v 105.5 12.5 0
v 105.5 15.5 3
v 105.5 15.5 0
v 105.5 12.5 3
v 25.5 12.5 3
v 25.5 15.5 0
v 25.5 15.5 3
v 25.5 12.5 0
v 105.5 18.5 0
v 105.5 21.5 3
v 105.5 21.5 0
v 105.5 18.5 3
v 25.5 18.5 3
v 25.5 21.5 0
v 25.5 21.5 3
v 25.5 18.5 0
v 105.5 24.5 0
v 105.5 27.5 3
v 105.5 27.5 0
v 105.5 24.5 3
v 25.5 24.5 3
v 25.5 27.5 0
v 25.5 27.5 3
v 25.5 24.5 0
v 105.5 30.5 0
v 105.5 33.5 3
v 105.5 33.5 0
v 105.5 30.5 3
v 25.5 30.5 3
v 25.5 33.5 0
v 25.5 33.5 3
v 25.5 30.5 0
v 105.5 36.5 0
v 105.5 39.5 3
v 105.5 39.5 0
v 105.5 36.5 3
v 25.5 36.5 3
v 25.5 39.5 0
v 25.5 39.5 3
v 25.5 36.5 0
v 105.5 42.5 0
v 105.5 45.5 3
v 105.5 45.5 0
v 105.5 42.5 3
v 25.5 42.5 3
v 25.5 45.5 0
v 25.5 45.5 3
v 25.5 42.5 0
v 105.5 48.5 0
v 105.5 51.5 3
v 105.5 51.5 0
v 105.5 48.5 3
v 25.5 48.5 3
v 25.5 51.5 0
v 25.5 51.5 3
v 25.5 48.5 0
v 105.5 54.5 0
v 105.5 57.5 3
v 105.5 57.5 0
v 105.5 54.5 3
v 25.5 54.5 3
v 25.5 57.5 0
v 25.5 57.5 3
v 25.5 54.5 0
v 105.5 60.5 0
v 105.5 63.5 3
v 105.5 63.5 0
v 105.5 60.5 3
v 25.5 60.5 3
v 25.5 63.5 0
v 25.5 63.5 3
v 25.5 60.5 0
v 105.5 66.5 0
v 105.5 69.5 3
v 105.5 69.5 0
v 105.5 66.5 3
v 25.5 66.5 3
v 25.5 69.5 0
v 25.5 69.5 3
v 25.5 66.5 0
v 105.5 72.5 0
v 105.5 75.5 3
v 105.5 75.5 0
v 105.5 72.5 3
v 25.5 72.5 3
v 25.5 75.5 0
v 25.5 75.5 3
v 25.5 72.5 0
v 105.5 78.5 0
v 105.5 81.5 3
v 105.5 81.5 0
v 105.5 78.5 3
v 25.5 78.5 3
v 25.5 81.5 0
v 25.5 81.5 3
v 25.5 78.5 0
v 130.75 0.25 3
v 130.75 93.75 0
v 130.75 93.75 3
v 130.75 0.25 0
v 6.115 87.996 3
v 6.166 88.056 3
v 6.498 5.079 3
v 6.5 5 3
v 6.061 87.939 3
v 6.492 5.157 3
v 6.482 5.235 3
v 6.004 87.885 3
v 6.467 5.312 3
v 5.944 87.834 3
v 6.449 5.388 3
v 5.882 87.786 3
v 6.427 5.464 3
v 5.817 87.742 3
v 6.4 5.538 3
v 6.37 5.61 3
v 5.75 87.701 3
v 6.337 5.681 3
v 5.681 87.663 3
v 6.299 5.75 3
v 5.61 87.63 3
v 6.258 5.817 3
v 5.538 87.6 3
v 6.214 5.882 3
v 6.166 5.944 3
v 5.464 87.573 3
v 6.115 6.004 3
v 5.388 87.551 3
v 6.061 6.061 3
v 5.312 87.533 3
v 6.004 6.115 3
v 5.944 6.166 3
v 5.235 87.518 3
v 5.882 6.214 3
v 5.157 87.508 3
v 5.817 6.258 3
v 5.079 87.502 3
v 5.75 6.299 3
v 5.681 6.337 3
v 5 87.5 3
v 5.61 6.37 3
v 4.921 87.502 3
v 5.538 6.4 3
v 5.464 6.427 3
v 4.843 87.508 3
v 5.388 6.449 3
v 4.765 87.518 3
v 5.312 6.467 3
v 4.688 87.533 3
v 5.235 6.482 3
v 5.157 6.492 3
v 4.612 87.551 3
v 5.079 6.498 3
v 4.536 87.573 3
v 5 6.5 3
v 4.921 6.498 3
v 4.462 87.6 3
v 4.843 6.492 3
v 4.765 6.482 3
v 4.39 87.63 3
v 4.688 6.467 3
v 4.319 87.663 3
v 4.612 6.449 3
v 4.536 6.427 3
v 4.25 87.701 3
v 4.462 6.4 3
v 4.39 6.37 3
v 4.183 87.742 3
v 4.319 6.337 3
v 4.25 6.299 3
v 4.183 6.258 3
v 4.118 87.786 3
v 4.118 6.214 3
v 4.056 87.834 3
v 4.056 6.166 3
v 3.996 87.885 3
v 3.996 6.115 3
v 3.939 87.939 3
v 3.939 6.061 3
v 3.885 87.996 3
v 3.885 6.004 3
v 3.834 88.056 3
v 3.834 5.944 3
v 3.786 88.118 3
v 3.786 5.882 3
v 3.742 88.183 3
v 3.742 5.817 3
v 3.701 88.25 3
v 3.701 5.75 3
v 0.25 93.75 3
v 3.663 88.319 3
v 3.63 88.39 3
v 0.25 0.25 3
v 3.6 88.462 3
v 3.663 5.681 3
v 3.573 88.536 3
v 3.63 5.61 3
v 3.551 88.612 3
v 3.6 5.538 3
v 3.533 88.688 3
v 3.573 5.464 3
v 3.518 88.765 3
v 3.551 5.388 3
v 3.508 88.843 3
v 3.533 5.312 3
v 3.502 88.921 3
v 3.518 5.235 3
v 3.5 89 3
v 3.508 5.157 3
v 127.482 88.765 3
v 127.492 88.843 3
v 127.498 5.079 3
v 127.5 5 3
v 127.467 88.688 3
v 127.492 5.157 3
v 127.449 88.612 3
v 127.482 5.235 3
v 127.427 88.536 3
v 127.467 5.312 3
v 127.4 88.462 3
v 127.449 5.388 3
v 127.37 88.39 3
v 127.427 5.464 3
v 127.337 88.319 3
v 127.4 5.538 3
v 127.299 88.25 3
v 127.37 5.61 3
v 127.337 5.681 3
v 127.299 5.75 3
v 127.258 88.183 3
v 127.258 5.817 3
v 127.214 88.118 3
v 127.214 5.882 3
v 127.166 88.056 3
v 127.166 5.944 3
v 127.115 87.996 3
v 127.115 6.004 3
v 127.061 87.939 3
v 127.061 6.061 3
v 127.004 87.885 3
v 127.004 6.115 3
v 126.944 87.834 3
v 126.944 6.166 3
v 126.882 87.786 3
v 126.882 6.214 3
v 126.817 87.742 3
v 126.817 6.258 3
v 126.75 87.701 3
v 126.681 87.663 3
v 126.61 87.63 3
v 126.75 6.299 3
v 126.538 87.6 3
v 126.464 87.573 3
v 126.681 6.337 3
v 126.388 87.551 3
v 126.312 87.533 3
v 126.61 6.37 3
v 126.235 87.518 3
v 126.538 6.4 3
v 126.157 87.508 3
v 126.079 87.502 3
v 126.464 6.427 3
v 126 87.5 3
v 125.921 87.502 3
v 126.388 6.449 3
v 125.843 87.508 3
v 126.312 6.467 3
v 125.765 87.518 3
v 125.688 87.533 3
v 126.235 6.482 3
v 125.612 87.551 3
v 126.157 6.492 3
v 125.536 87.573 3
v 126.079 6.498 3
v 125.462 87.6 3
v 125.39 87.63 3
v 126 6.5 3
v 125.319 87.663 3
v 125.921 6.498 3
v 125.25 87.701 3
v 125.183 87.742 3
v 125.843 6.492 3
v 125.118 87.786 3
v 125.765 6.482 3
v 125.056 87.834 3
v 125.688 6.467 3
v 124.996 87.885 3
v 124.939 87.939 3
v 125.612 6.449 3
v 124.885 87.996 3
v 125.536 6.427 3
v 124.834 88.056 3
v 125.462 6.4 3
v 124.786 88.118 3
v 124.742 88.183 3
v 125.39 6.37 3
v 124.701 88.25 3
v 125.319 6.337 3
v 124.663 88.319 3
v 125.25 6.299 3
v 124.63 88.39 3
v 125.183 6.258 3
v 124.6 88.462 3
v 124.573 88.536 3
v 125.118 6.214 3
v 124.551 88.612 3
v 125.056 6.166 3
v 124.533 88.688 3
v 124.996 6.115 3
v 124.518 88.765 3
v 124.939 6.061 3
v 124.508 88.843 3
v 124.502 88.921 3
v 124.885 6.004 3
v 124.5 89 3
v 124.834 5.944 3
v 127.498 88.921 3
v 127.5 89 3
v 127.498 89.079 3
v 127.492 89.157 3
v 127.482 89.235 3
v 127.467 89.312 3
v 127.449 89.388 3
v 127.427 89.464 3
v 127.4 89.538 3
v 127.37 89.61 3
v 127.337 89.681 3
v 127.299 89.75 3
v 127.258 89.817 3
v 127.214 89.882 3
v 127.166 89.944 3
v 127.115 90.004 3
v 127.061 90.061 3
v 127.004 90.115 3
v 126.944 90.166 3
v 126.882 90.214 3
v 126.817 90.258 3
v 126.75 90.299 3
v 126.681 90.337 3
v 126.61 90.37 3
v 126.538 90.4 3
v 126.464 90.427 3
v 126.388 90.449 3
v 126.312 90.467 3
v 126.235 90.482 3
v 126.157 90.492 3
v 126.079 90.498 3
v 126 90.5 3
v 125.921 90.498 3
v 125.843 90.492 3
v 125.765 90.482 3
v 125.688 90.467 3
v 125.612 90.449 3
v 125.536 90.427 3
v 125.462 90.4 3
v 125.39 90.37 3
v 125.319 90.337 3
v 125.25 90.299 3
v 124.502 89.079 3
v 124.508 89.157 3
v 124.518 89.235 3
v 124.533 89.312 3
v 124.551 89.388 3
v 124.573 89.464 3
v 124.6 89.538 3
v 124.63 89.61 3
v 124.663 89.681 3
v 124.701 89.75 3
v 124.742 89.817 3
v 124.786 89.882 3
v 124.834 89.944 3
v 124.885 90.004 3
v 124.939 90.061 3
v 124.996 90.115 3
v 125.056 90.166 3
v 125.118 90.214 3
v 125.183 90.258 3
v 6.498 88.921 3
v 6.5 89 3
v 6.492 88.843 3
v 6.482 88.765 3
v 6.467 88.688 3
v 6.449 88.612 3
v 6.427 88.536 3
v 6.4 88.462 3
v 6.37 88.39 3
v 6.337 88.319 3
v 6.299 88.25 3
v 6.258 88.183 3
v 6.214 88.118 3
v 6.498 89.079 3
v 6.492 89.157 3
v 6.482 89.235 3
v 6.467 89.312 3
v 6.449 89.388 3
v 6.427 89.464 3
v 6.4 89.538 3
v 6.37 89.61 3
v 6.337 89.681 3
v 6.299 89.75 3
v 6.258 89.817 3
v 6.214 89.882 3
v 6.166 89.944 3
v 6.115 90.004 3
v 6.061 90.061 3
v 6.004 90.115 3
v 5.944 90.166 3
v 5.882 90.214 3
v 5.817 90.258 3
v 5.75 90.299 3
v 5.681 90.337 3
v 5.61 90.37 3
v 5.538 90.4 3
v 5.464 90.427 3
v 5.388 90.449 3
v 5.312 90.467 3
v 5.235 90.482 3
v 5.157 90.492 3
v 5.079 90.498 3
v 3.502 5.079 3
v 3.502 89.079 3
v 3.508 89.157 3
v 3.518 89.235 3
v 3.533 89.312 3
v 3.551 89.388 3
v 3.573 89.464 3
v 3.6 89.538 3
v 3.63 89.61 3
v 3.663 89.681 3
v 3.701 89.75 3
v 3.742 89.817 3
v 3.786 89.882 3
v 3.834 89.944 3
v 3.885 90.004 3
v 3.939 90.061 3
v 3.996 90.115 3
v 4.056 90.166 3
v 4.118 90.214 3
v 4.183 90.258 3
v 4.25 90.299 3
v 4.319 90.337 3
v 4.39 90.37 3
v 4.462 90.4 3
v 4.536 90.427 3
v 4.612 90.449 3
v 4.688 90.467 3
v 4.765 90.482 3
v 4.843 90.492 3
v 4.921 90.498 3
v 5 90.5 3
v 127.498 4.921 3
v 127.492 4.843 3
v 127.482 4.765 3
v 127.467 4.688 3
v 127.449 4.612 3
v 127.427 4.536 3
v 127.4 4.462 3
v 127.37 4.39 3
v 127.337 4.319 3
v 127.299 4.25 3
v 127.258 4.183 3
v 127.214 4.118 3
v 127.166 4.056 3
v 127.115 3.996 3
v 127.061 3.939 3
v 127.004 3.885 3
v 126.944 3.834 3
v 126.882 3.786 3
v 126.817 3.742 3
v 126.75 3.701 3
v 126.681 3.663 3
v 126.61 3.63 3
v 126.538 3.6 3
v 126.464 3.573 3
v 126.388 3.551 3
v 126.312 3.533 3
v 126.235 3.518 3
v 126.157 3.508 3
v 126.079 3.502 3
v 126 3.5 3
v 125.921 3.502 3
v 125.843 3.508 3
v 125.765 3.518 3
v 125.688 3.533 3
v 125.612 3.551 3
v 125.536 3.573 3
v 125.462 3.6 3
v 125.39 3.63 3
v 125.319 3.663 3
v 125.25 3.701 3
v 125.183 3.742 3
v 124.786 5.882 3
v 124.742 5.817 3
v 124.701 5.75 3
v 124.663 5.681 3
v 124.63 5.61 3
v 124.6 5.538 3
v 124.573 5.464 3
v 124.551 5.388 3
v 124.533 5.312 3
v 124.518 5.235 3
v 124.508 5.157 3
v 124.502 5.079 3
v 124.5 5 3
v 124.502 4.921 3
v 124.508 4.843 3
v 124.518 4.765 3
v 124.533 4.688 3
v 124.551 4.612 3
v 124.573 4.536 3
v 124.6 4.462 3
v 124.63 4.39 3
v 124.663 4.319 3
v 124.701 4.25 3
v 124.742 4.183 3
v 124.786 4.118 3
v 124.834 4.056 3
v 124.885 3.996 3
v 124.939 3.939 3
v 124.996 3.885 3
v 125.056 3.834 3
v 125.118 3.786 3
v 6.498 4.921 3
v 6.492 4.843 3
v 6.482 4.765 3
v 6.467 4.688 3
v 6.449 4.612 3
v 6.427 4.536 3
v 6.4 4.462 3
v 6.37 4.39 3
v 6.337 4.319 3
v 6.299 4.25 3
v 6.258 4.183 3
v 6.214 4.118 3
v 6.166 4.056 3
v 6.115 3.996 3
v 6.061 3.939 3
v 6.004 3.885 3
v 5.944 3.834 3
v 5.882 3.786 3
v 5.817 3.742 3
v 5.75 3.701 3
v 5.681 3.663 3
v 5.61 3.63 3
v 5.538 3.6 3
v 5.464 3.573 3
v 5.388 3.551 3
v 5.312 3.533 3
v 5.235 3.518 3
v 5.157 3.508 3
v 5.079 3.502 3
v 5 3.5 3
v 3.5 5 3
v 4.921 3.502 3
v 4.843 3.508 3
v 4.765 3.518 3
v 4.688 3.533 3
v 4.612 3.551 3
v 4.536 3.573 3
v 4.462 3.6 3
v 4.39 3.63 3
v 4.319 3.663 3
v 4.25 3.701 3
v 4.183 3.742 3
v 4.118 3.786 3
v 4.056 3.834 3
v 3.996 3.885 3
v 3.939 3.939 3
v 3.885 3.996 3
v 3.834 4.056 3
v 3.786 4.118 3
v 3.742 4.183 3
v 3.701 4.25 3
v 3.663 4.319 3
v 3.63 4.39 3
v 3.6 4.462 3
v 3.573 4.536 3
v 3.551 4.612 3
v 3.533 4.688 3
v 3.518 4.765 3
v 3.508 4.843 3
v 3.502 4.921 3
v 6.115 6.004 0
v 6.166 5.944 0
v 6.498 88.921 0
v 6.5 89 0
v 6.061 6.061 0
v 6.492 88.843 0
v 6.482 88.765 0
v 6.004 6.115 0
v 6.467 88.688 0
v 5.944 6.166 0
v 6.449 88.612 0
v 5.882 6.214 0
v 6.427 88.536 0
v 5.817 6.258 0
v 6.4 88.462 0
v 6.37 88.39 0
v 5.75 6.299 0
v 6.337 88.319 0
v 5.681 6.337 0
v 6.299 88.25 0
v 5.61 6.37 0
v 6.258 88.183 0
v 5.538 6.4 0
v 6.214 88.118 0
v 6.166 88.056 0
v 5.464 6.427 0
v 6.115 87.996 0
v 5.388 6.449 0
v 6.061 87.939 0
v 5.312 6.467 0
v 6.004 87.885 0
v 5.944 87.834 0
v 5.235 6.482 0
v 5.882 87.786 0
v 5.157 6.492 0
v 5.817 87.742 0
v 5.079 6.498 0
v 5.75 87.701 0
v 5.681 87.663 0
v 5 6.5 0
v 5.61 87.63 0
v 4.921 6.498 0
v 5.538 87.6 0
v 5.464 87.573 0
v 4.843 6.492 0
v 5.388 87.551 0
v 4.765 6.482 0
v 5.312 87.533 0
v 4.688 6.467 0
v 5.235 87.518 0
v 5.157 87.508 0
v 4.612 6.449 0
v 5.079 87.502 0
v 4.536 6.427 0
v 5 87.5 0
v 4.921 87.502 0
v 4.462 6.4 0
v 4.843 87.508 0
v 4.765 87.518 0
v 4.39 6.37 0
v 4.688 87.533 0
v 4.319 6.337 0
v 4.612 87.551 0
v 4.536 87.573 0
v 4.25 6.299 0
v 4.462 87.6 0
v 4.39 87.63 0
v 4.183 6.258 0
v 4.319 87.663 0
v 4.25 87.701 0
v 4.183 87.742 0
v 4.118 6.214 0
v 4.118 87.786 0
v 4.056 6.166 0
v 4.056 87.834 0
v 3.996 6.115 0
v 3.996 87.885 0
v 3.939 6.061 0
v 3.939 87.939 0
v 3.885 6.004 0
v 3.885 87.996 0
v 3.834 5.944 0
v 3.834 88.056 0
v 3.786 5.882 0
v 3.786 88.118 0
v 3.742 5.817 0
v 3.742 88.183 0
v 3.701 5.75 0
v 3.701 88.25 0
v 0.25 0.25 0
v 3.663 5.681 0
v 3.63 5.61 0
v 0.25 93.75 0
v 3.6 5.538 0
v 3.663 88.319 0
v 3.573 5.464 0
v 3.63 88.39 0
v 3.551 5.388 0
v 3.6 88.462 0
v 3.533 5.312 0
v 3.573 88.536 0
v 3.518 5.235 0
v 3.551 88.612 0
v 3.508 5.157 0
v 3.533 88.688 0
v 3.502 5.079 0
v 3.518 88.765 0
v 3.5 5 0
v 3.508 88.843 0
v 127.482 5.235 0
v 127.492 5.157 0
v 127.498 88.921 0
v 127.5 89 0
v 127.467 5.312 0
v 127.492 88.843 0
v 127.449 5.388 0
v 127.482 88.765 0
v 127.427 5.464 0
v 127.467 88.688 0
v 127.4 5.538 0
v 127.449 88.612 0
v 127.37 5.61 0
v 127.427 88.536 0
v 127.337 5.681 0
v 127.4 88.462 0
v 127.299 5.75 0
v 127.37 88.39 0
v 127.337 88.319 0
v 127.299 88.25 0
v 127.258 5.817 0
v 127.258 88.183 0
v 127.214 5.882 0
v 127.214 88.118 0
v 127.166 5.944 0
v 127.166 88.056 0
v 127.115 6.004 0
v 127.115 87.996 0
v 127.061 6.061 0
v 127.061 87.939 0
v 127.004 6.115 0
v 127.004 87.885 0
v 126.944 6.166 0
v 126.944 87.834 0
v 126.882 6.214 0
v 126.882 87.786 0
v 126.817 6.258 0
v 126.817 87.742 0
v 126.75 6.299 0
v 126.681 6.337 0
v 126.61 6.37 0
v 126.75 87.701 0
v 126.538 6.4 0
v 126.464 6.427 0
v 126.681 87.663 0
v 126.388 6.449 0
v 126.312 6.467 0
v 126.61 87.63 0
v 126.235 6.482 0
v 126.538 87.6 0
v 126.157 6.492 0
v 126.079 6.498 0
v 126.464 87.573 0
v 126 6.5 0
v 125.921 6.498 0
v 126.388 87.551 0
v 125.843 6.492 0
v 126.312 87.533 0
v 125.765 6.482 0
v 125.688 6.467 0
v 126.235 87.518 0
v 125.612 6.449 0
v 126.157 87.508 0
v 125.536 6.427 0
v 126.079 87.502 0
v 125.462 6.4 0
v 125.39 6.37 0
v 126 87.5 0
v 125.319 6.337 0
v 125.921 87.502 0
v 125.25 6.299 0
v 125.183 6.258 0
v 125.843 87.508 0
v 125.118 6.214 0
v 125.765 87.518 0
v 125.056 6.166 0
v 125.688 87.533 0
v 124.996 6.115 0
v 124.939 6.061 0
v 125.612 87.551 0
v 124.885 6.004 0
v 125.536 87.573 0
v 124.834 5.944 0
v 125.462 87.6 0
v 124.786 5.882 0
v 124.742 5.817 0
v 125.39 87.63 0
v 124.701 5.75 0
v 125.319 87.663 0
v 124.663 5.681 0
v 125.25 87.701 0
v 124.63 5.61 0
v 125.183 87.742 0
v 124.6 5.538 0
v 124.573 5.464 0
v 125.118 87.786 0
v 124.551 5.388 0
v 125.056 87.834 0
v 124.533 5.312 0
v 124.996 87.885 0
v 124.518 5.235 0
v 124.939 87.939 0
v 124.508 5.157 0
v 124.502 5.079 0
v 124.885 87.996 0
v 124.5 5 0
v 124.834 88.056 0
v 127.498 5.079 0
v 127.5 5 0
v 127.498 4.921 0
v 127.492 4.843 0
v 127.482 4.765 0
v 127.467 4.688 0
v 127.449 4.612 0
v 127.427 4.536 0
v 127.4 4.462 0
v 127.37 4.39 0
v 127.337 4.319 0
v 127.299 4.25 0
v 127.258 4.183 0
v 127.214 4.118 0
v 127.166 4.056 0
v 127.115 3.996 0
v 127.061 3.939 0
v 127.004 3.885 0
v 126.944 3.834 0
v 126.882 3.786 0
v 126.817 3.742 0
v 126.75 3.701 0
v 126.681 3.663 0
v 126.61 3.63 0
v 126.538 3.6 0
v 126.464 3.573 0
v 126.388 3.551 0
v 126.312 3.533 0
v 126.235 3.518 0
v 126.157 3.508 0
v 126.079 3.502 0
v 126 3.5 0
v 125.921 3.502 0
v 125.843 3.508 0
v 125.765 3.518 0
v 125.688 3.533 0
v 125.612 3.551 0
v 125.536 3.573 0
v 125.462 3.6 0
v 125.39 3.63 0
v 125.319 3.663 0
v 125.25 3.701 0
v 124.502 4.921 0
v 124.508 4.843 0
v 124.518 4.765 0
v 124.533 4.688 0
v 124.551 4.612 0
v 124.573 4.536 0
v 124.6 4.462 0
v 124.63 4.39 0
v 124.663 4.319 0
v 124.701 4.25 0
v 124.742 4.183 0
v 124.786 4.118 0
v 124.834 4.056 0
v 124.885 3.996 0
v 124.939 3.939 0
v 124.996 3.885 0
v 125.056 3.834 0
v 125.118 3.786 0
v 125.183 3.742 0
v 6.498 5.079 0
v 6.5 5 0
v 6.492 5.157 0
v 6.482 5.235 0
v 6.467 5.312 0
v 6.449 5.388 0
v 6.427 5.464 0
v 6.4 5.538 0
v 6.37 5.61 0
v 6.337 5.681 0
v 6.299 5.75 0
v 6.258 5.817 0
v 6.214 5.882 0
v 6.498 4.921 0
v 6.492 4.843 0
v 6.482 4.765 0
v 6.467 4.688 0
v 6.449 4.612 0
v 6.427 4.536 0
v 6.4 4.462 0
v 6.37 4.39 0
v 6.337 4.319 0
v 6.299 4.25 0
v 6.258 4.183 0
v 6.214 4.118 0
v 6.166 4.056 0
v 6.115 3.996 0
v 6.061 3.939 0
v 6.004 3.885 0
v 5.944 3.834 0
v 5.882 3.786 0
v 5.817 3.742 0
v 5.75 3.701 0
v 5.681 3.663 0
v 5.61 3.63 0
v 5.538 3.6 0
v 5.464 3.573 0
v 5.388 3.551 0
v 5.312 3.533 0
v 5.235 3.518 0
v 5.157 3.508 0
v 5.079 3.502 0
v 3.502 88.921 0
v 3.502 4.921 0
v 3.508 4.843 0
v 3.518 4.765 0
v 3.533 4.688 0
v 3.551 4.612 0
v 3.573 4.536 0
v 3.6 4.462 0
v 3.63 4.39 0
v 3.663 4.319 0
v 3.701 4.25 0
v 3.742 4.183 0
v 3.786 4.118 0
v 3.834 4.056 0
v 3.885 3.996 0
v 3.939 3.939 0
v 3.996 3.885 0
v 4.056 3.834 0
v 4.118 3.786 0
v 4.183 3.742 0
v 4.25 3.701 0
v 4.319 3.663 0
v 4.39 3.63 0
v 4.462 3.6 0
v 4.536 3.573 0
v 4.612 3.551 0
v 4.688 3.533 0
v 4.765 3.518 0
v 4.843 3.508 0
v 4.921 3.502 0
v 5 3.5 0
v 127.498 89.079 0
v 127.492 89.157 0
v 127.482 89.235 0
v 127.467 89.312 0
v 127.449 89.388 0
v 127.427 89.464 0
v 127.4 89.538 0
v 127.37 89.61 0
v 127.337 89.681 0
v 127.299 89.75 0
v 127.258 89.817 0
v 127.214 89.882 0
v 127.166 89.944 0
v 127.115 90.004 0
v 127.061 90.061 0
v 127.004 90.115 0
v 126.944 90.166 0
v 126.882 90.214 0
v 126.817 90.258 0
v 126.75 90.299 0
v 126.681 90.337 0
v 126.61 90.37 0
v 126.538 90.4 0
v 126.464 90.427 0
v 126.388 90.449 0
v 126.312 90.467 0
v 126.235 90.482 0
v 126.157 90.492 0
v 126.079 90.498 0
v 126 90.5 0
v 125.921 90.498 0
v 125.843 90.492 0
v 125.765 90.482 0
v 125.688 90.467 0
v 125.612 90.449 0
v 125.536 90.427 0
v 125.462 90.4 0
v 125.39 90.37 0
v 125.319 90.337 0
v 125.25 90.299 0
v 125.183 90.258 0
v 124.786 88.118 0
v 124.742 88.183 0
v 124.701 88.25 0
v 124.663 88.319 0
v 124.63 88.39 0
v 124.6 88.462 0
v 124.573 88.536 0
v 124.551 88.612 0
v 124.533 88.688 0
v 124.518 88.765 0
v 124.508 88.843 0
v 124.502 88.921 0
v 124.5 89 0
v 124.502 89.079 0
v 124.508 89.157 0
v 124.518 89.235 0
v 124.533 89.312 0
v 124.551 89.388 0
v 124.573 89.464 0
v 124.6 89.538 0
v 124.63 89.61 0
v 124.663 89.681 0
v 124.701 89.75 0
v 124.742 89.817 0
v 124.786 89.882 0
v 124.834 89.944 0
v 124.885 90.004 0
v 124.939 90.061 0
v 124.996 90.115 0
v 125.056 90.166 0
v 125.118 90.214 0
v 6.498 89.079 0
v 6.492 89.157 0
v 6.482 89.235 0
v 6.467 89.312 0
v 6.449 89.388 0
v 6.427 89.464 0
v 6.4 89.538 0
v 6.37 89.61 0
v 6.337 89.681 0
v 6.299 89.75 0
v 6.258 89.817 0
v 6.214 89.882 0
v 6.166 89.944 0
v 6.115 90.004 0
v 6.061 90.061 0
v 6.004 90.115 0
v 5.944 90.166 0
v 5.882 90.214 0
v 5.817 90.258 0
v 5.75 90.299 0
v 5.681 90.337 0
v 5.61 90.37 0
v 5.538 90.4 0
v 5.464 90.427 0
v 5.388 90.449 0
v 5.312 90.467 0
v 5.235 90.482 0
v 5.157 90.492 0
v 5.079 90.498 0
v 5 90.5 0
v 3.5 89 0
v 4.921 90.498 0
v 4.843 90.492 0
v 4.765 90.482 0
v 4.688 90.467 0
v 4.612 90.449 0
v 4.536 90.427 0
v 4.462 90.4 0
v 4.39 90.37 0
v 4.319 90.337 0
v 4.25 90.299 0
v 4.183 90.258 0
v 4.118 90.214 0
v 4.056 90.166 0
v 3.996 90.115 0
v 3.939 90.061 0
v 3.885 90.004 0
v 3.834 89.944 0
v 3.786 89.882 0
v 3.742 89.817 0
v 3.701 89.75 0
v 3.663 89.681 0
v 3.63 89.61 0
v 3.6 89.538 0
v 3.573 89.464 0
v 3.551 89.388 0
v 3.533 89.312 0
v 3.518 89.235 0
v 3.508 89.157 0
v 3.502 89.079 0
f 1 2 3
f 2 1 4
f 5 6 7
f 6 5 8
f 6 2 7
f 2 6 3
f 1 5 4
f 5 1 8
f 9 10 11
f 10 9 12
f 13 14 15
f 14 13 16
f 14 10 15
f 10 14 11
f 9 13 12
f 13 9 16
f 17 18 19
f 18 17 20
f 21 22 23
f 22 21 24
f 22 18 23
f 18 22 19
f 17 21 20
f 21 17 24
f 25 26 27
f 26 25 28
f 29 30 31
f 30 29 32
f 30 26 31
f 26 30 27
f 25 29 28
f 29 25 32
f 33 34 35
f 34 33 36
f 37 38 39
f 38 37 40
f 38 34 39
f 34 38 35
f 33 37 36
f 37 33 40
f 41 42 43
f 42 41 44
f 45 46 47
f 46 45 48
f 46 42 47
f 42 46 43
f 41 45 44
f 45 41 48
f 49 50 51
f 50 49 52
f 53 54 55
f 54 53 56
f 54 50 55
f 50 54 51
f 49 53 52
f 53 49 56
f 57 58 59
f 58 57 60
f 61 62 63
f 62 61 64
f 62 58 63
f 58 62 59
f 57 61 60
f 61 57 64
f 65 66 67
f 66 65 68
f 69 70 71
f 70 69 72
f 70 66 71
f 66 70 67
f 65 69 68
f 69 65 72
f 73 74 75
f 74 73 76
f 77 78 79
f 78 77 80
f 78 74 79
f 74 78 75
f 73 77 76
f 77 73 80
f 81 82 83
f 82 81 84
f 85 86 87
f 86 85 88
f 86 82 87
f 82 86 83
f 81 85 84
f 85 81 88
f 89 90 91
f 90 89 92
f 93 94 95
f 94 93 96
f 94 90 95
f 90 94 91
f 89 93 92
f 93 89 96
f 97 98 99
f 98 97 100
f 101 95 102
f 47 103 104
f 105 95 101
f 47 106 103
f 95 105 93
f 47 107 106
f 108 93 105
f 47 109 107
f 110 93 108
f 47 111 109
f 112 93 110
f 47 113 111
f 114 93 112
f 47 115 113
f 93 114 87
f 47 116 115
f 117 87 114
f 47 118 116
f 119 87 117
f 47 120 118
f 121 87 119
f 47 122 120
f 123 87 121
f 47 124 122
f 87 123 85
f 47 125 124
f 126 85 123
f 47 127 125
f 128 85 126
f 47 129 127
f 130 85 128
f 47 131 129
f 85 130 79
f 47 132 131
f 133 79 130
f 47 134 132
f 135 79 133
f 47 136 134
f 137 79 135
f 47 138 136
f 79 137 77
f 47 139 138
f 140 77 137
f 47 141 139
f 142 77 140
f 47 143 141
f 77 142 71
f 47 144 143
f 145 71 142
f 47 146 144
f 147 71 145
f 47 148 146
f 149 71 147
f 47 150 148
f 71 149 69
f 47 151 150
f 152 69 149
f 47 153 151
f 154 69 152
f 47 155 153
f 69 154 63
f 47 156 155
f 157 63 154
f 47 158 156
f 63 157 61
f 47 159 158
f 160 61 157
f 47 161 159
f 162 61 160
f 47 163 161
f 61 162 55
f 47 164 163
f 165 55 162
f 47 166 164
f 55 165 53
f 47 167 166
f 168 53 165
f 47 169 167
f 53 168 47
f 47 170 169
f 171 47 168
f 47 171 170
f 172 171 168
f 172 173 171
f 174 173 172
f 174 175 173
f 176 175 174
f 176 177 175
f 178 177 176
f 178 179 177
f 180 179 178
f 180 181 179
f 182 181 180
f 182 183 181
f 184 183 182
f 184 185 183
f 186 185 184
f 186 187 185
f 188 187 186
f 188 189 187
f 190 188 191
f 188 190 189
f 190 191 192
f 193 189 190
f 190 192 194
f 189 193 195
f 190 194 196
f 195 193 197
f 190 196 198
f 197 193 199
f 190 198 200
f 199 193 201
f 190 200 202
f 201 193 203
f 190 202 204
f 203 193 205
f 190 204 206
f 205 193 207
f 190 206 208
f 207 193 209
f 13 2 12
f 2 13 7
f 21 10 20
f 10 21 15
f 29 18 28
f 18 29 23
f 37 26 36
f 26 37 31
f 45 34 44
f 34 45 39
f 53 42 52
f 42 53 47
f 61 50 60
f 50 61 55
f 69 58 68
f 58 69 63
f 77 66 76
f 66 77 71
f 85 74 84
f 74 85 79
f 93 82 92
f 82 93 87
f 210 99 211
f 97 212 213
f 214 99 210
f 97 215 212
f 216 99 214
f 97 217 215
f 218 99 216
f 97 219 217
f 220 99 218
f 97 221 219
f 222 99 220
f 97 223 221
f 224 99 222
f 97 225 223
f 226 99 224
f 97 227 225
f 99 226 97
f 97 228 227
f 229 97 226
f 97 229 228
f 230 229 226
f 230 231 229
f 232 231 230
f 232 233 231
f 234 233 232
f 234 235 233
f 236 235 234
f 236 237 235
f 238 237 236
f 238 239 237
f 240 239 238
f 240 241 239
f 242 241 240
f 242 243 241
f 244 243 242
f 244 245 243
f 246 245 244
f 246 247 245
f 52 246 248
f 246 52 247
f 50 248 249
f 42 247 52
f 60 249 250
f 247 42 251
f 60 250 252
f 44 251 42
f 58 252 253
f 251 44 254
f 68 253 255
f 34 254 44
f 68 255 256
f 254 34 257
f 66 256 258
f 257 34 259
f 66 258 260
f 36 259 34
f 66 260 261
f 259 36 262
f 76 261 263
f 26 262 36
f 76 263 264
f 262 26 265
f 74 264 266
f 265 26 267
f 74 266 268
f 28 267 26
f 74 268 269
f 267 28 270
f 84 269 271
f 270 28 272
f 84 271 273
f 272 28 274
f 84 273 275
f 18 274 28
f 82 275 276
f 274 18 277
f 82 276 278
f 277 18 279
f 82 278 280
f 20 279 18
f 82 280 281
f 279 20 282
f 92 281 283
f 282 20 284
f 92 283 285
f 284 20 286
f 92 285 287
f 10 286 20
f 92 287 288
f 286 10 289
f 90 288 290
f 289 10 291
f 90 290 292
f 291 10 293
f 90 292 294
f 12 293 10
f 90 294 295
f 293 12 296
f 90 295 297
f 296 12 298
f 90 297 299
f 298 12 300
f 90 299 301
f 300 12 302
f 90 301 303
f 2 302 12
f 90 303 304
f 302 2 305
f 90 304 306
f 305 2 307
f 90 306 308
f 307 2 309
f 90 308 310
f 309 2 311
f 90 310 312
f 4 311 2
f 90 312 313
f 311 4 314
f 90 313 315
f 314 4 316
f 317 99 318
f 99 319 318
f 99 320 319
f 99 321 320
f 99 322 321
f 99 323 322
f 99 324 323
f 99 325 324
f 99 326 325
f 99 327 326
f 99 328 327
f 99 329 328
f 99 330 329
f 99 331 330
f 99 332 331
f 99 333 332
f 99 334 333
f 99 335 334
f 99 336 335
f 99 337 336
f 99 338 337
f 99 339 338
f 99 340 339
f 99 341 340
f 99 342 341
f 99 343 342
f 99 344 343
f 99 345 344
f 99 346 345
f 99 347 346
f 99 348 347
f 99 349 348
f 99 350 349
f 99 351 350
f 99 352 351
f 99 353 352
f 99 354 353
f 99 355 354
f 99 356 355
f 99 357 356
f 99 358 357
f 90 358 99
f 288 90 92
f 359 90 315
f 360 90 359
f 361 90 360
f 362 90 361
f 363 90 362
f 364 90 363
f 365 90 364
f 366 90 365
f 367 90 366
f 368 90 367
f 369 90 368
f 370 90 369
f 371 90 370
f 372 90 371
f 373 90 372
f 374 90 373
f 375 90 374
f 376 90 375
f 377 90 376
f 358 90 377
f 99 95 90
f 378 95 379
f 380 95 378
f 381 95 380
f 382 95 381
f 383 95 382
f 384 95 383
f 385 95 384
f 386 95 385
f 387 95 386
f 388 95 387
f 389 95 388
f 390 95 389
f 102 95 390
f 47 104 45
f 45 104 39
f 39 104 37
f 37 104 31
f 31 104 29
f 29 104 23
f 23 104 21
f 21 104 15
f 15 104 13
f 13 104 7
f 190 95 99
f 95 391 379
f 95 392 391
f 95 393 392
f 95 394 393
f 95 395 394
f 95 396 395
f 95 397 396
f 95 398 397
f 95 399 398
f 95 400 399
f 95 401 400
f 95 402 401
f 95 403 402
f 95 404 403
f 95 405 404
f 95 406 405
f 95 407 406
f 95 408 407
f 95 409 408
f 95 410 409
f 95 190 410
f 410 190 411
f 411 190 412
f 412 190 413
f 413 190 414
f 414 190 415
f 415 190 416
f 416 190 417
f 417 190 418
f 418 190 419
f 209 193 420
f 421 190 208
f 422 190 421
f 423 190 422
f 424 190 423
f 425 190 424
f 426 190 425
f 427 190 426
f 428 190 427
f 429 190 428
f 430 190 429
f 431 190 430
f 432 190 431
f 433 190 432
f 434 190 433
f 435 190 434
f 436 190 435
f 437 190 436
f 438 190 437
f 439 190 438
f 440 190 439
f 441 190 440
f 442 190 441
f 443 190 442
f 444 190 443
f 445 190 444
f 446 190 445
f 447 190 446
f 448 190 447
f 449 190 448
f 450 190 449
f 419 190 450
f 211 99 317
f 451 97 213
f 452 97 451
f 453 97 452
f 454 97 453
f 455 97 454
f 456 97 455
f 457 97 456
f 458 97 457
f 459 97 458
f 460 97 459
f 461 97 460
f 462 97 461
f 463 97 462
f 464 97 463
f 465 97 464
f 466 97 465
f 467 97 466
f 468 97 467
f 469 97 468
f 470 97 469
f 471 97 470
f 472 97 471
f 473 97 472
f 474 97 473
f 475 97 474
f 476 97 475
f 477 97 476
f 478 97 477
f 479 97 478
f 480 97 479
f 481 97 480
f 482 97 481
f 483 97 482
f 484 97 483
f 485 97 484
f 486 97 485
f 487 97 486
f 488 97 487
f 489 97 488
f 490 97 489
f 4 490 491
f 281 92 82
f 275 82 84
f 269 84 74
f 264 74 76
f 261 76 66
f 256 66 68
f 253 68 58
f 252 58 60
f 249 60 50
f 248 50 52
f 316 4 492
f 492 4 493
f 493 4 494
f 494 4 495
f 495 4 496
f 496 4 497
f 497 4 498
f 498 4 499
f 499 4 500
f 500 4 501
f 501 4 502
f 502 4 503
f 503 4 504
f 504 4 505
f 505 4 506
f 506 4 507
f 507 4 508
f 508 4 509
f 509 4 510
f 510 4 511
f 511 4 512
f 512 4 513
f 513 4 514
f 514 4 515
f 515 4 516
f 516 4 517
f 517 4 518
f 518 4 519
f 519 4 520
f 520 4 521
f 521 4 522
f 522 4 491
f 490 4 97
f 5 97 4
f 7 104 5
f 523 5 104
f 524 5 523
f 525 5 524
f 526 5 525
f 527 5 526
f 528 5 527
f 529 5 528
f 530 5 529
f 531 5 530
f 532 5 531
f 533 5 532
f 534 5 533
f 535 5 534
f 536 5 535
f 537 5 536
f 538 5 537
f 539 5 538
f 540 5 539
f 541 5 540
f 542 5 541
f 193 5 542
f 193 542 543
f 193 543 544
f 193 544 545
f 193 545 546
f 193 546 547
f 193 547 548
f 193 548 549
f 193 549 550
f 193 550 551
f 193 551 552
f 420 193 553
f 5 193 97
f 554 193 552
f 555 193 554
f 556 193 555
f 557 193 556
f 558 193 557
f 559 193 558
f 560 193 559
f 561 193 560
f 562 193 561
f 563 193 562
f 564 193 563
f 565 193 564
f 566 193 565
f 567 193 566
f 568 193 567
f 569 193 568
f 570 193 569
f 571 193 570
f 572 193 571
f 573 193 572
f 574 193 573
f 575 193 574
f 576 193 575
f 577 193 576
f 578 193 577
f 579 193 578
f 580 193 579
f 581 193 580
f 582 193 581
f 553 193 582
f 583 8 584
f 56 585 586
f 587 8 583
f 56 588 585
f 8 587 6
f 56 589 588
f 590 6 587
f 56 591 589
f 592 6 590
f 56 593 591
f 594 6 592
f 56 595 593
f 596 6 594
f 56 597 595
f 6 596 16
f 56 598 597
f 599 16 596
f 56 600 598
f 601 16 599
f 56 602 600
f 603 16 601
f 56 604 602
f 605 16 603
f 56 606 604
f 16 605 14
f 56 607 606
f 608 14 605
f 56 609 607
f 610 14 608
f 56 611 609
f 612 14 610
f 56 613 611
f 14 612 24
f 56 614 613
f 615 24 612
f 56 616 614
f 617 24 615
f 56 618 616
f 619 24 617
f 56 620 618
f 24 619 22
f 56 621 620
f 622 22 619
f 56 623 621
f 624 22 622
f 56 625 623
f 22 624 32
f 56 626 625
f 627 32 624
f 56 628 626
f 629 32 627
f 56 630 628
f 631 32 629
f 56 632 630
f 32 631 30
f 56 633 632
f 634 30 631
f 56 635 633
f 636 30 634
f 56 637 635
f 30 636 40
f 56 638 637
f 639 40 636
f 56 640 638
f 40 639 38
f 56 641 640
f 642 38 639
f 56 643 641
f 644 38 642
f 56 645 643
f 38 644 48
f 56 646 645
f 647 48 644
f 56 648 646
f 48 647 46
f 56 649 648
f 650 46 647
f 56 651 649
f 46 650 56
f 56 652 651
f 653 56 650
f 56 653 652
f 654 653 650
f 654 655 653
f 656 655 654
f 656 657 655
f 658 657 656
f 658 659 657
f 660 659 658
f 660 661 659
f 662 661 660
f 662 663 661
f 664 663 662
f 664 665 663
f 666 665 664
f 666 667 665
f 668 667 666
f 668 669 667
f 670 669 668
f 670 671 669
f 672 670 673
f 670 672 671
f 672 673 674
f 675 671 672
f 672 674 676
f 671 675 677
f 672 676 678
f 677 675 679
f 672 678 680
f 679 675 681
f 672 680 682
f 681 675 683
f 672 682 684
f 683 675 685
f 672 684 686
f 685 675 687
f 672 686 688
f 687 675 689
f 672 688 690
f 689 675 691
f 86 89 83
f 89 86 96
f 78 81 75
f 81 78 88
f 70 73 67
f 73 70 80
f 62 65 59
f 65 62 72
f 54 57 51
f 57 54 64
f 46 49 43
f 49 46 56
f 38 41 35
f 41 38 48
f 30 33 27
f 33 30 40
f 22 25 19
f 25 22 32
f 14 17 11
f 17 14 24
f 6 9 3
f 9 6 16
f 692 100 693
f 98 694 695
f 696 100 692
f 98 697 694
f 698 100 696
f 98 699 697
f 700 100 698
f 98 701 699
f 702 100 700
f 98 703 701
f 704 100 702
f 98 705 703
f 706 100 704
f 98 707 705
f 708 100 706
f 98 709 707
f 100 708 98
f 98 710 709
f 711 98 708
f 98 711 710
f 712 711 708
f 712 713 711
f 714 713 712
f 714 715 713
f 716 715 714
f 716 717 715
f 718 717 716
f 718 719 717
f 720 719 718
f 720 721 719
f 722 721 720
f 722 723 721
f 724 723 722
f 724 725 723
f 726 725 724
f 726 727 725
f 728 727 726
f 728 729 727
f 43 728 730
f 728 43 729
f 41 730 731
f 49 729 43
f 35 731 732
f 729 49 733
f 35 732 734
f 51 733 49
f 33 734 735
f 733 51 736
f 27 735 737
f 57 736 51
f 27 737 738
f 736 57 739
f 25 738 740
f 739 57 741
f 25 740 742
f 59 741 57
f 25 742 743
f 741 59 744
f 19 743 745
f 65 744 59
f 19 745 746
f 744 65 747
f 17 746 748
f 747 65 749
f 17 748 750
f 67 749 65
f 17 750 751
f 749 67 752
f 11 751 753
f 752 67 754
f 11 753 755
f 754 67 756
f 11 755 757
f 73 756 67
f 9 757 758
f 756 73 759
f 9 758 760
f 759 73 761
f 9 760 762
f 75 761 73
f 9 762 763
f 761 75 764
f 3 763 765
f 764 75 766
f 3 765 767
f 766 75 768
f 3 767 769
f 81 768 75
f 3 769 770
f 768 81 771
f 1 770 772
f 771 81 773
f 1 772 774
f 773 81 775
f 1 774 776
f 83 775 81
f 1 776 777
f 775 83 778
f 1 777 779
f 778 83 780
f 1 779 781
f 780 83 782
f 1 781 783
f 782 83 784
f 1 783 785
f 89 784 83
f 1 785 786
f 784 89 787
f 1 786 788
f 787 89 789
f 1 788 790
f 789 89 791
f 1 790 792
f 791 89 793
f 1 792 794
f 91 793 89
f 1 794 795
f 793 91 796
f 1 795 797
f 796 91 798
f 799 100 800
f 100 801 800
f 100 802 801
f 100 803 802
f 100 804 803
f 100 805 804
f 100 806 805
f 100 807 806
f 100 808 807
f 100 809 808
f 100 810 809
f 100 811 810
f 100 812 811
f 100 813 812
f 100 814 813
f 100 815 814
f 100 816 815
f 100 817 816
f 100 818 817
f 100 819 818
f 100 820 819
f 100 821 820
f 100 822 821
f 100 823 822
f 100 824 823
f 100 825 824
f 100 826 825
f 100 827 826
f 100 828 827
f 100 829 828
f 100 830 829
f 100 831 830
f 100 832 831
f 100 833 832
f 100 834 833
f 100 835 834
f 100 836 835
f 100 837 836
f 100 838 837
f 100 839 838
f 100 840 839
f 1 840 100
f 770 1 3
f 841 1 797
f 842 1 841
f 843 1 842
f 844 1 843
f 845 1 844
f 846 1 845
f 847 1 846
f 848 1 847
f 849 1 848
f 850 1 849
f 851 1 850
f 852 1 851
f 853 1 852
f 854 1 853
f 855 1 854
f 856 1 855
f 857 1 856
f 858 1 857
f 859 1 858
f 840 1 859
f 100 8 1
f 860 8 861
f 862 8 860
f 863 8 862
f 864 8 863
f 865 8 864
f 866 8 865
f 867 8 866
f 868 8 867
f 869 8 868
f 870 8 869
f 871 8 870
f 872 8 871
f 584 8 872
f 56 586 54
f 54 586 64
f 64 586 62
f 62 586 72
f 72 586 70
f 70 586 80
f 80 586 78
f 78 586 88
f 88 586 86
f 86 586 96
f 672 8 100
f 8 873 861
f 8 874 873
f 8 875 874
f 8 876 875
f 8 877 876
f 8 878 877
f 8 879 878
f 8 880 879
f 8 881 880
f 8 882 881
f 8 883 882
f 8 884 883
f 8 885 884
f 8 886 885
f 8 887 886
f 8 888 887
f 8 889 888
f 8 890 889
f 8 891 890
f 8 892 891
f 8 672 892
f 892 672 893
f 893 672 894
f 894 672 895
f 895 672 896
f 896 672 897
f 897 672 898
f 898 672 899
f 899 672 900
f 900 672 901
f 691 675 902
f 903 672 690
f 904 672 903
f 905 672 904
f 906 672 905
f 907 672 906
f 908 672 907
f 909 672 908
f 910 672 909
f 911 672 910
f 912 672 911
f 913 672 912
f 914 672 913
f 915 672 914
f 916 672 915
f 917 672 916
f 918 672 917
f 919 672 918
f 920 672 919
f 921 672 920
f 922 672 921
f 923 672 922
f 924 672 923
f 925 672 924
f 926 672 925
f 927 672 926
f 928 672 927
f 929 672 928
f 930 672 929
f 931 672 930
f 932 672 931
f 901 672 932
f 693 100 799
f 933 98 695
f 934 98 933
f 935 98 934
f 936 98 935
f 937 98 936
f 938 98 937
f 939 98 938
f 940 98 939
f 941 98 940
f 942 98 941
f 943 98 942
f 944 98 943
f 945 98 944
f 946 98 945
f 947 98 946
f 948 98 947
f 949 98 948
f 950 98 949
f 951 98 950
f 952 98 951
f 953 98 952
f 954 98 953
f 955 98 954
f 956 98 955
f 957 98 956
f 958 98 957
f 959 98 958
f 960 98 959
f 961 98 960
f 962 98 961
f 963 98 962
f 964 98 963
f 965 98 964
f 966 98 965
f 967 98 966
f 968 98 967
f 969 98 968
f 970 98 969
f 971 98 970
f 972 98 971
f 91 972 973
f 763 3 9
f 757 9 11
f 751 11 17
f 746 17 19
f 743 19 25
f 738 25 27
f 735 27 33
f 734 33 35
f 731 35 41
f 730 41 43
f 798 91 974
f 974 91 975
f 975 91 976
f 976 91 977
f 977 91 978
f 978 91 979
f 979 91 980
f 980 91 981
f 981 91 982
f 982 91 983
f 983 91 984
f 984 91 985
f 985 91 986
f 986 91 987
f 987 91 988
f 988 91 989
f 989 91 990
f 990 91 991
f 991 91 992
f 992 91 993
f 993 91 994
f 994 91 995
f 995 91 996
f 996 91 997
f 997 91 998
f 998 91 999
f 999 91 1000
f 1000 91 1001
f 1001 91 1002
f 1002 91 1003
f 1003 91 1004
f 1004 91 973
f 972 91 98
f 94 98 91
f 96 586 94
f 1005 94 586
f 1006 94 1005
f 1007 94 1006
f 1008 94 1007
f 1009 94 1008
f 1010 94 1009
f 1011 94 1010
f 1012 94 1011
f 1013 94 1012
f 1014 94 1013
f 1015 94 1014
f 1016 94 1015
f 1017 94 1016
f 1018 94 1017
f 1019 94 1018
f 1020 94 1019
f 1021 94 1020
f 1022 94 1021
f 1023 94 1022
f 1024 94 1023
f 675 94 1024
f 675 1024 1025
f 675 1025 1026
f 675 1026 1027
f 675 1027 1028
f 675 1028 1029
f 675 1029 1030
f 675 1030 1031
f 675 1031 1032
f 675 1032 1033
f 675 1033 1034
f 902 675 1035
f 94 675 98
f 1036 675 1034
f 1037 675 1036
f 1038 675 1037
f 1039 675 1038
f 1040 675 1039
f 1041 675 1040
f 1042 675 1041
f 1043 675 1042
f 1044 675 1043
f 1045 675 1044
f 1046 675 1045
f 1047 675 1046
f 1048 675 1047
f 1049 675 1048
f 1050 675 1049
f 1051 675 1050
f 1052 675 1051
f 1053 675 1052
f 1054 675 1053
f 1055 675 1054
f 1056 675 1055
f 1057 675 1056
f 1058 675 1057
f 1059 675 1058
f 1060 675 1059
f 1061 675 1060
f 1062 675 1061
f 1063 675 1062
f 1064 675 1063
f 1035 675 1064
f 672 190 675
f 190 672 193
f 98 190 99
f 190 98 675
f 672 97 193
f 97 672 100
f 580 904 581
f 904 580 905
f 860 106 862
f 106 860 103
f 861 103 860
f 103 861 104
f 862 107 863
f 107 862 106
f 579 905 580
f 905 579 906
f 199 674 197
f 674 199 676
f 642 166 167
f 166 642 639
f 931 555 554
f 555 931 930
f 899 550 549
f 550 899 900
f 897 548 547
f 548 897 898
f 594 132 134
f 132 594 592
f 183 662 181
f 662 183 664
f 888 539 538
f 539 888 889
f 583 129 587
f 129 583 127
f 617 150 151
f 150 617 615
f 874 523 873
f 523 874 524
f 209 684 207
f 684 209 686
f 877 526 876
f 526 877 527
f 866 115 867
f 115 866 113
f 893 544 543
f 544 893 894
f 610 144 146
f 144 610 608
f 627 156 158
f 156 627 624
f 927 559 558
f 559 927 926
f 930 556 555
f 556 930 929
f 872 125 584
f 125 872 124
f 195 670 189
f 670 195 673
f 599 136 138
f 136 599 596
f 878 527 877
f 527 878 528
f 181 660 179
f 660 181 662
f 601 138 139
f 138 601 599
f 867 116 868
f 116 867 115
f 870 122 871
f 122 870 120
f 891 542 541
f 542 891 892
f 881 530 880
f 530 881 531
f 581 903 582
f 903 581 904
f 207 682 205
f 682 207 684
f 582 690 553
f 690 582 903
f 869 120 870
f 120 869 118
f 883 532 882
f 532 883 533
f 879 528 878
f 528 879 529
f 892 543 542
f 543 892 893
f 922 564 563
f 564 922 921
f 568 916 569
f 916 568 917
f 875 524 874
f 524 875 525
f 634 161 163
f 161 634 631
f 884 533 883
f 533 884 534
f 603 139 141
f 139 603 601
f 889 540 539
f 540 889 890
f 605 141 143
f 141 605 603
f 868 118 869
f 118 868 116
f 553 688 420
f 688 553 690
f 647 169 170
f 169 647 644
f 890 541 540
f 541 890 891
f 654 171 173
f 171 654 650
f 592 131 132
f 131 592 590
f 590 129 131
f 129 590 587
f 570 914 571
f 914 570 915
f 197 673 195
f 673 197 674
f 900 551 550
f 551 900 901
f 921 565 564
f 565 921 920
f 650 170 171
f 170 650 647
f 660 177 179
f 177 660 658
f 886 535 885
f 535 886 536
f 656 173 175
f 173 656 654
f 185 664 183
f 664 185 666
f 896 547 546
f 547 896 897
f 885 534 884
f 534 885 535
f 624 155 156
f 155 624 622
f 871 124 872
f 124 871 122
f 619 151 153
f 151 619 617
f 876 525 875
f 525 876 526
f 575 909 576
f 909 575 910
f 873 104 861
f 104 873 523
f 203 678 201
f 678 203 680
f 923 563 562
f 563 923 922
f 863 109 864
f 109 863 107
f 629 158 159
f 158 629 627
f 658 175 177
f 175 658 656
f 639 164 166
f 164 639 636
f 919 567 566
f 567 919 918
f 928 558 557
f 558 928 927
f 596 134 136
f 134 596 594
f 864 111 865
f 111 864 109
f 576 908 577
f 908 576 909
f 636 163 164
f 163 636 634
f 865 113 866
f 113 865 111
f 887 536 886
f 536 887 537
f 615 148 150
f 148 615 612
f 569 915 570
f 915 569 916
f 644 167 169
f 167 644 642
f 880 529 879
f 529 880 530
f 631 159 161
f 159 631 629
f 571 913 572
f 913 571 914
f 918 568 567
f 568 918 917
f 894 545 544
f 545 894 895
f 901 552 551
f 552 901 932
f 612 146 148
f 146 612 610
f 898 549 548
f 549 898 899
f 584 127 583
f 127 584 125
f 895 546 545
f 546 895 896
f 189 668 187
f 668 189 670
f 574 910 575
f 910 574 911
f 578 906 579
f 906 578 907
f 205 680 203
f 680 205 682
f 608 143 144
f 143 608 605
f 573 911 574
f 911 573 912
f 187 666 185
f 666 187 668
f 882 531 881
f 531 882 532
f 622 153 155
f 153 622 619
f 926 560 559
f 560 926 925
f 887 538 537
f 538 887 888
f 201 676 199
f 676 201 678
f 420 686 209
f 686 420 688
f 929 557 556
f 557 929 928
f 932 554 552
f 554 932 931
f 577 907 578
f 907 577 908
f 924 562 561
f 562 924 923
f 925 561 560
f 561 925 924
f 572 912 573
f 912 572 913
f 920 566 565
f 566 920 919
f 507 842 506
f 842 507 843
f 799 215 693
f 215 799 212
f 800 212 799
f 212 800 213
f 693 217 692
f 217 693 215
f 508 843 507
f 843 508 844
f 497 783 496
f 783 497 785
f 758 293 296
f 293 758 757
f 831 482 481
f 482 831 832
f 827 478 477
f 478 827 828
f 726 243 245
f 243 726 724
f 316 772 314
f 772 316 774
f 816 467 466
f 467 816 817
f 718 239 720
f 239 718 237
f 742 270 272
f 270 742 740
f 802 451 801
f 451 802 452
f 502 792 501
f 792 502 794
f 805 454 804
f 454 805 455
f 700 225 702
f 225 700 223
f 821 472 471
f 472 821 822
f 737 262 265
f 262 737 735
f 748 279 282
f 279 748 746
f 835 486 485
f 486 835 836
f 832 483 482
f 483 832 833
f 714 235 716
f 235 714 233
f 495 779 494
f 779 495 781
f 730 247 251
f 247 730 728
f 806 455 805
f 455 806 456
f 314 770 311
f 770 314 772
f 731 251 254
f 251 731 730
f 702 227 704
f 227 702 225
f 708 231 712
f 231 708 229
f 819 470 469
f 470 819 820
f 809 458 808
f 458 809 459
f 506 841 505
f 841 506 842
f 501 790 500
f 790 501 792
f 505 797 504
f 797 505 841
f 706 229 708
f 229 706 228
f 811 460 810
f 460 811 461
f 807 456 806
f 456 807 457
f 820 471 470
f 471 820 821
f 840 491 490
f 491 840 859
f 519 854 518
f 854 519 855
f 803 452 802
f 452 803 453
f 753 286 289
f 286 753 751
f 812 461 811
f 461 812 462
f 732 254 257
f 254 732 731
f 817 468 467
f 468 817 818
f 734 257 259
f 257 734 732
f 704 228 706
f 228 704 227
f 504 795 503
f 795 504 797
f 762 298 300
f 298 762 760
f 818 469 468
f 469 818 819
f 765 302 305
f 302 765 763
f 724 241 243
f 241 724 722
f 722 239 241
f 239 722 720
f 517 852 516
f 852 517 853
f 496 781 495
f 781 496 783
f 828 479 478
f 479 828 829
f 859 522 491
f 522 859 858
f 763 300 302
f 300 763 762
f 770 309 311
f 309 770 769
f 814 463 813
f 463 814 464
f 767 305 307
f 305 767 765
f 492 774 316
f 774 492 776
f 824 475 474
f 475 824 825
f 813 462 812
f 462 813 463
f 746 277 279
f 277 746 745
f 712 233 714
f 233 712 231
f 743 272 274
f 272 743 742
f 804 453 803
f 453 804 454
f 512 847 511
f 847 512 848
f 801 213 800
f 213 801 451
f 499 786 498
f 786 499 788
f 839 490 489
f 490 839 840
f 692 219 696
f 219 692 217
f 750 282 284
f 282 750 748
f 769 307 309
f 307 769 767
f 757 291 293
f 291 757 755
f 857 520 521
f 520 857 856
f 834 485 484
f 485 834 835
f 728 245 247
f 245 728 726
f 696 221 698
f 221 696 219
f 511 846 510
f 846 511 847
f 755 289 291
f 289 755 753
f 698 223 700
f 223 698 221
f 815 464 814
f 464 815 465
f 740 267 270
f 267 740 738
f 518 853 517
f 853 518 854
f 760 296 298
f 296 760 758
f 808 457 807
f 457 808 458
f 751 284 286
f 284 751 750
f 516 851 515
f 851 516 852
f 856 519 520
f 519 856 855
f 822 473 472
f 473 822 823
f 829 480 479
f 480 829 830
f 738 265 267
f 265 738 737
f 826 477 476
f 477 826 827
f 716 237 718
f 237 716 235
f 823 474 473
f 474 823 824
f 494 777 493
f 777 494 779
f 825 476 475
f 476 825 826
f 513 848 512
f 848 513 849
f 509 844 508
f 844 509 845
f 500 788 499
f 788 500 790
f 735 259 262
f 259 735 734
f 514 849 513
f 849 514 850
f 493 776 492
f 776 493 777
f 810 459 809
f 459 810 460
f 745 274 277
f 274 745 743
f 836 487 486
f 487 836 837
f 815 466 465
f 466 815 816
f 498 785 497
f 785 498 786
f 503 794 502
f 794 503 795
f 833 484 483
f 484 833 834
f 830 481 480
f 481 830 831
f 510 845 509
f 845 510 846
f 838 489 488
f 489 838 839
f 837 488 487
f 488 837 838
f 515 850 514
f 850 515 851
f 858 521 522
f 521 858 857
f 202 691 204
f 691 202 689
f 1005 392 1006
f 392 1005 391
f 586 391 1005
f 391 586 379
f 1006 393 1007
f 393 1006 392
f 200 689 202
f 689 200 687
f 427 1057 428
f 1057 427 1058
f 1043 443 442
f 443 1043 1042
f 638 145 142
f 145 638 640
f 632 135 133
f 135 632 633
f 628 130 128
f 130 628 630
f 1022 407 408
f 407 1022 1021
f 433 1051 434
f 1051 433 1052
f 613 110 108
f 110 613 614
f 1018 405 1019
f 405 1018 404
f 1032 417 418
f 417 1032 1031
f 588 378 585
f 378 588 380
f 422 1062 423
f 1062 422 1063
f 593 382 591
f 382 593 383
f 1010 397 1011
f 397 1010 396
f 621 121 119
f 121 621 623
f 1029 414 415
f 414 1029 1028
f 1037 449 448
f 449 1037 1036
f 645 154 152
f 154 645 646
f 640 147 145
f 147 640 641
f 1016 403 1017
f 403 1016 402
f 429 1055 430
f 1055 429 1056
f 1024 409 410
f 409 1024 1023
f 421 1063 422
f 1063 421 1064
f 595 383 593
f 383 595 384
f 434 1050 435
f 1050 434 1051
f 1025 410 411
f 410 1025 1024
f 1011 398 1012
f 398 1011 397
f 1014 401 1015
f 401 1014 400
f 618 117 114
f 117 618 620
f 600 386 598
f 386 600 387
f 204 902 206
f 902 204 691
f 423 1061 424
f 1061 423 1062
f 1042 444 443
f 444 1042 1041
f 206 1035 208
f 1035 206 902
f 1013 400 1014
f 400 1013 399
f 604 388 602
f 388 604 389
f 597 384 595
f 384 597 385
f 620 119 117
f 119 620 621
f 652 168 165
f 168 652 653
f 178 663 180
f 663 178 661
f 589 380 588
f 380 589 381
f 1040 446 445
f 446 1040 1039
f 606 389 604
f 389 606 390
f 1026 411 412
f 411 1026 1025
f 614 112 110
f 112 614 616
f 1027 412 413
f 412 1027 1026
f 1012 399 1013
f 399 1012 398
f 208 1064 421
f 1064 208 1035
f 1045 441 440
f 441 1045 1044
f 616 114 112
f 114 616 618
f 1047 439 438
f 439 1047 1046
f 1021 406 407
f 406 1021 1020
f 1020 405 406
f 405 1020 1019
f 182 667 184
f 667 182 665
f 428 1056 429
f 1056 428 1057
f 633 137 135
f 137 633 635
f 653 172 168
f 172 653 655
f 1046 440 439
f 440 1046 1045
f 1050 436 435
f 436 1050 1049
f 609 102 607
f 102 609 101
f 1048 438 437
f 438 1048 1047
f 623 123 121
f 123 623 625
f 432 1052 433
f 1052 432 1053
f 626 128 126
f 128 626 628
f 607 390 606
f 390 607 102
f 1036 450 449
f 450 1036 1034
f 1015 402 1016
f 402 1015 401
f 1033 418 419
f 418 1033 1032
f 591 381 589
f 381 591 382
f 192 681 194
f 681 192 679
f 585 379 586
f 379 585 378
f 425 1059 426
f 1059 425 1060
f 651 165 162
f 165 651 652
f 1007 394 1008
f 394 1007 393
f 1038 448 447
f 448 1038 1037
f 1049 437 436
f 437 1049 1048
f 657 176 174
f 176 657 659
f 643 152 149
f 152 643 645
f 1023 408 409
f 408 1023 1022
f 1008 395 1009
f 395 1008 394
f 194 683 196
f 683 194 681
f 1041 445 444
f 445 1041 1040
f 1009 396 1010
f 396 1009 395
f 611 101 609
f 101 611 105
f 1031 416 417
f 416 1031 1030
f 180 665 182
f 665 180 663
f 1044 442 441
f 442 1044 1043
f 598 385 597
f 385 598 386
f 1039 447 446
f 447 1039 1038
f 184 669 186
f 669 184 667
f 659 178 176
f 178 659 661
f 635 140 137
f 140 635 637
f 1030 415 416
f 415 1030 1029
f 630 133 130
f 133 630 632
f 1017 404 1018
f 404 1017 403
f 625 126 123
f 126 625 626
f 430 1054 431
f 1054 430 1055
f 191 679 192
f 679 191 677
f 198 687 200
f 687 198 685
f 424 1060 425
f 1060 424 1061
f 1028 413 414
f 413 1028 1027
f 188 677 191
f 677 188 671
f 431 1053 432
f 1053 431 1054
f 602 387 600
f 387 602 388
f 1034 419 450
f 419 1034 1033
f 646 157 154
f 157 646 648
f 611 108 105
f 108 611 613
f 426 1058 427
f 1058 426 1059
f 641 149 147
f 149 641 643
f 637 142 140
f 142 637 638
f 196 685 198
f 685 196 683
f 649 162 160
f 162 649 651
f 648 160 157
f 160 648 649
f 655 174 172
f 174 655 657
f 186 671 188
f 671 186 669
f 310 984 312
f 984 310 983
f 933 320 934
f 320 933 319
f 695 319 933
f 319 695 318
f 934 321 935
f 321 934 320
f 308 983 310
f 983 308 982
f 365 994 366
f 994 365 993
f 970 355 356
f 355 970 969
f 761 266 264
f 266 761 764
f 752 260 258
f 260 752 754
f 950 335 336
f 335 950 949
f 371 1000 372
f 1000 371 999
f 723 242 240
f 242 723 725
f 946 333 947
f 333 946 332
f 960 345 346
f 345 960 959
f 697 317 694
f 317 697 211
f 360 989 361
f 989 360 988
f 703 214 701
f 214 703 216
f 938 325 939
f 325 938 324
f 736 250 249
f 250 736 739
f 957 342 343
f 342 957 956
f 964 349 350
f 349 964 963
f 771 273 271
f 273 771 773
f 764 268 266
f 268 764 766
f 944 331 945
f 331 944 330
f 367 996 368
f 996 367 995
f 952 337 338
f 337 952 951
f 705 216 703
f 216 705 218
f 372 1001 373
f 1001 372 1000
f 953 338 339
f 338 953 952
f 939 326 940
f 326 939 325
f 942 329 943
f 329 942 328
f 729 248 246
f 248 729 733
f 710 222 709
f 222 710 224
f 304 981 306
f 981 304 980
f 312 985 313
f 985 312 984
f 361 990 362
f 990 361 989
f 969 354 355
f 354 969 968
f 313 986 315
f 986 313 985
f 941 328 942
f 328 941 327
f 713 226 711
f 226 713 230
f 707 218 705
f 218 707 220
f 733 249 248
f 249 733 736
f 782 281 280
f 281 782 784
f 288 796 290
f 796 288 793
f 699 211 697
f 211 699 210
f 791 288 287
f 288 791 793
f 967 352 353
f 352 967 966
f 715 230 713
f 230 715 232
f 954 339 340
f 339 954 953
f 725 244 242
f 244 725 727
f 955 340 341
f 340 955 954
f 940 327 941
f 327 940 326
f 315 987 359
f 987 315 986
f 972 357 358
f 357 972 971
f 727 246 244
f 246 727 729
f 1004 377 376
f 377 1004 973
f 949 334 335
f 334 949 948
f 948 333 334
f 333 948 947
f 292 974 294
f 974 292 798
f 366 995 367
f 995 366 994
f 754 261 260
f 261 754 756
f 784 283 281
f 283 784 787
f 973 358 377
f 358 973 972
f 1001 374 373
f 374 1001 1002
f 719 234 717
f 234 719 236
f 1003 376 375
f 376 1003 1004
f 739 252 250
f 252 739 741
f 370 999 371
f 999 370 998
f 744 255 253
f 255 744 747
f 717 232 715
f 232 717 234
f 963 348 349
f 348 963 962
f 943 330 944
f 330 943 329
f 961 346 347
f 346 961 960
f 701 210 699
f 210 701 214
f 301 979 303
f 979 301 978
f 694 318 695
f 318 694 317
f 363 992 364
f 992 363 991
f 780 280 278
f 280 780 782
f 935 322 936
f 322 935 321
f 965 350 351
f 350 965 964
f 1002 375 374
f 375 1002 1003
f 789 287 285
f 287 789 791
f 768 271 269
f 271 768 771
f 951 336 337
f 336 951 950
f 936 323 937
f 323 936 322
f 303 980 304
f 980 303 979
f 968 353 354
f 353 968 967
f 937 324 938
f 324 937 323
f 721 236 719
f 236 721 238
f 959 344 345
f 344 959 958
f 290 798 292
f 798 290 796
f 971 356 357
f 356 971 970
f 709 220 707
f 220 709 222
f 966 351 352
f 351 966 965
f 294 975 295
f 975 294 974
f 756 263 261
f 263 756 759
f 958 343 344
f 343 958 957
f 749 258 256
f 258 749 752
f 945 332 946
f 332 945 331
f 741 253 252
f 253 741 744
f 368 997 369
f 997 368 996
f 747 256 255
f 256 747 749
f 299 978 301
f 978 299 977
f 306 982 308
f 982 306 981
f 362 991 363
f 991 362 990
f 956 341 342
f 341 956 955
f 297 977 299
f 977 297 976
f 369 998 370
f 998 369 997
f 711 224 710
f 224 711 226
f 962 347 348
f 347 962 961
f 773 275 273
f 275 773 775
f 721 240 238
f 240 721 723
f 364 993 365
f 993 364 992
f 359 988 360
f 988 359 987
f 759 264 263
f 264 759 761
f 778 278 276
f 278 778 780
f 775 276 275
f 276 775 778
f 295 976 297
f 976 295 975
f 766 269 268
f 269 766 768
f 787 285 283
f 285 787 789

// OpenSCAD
$fn = 120;

pcb_hole_distance_x = 119;
pcb_hole_distance_y = 71;

pcb_border_from_holes = 6;
extra_front_space = 17;

len_x = pcb_hole_distance_x + 2 * pcb_border_from_holes;
len_y = pcb_hole_distance_y + pcb_border_from_holes + extra_front_space;
border_shrink = 0.5;
thickness = 3;

hole_distance_from_edge = 5;


difference() {
    translate([border_shrink / 2, border_shrink / 2, 0])
        cube([len_x - border_shrink, len_y - border_shrink, thickness]);
    
    translate([hole_distance_from_edge, hole_distance_from_edge, -1])
        cylinder(h = thickness + 2, d = 3);

    translate([len_x - hole_distance_from_edge, hole_distance_from_edge, -1])
        cylinder(h = thickness + 2, d = 3);

    translate([hole_distance_from_edge, len_y - hole_distance_from_edge, -1])
        cylinder(h = thickness + 2, d = 3);

    translate([len_x - hole_distance_from_edge, len_y - hole_distance_from_edge, -1])
        cylinder(h = thickness + 2, d = 3);

    for (i = [-11 * thickness : 2 * thickness : 11 * thickness])
        translate([(len_x - 80) / 2, i - (thickness / 2) + (len_y / 2) , -1])
            #cube([80, thickness, thickness + 2]);
}
